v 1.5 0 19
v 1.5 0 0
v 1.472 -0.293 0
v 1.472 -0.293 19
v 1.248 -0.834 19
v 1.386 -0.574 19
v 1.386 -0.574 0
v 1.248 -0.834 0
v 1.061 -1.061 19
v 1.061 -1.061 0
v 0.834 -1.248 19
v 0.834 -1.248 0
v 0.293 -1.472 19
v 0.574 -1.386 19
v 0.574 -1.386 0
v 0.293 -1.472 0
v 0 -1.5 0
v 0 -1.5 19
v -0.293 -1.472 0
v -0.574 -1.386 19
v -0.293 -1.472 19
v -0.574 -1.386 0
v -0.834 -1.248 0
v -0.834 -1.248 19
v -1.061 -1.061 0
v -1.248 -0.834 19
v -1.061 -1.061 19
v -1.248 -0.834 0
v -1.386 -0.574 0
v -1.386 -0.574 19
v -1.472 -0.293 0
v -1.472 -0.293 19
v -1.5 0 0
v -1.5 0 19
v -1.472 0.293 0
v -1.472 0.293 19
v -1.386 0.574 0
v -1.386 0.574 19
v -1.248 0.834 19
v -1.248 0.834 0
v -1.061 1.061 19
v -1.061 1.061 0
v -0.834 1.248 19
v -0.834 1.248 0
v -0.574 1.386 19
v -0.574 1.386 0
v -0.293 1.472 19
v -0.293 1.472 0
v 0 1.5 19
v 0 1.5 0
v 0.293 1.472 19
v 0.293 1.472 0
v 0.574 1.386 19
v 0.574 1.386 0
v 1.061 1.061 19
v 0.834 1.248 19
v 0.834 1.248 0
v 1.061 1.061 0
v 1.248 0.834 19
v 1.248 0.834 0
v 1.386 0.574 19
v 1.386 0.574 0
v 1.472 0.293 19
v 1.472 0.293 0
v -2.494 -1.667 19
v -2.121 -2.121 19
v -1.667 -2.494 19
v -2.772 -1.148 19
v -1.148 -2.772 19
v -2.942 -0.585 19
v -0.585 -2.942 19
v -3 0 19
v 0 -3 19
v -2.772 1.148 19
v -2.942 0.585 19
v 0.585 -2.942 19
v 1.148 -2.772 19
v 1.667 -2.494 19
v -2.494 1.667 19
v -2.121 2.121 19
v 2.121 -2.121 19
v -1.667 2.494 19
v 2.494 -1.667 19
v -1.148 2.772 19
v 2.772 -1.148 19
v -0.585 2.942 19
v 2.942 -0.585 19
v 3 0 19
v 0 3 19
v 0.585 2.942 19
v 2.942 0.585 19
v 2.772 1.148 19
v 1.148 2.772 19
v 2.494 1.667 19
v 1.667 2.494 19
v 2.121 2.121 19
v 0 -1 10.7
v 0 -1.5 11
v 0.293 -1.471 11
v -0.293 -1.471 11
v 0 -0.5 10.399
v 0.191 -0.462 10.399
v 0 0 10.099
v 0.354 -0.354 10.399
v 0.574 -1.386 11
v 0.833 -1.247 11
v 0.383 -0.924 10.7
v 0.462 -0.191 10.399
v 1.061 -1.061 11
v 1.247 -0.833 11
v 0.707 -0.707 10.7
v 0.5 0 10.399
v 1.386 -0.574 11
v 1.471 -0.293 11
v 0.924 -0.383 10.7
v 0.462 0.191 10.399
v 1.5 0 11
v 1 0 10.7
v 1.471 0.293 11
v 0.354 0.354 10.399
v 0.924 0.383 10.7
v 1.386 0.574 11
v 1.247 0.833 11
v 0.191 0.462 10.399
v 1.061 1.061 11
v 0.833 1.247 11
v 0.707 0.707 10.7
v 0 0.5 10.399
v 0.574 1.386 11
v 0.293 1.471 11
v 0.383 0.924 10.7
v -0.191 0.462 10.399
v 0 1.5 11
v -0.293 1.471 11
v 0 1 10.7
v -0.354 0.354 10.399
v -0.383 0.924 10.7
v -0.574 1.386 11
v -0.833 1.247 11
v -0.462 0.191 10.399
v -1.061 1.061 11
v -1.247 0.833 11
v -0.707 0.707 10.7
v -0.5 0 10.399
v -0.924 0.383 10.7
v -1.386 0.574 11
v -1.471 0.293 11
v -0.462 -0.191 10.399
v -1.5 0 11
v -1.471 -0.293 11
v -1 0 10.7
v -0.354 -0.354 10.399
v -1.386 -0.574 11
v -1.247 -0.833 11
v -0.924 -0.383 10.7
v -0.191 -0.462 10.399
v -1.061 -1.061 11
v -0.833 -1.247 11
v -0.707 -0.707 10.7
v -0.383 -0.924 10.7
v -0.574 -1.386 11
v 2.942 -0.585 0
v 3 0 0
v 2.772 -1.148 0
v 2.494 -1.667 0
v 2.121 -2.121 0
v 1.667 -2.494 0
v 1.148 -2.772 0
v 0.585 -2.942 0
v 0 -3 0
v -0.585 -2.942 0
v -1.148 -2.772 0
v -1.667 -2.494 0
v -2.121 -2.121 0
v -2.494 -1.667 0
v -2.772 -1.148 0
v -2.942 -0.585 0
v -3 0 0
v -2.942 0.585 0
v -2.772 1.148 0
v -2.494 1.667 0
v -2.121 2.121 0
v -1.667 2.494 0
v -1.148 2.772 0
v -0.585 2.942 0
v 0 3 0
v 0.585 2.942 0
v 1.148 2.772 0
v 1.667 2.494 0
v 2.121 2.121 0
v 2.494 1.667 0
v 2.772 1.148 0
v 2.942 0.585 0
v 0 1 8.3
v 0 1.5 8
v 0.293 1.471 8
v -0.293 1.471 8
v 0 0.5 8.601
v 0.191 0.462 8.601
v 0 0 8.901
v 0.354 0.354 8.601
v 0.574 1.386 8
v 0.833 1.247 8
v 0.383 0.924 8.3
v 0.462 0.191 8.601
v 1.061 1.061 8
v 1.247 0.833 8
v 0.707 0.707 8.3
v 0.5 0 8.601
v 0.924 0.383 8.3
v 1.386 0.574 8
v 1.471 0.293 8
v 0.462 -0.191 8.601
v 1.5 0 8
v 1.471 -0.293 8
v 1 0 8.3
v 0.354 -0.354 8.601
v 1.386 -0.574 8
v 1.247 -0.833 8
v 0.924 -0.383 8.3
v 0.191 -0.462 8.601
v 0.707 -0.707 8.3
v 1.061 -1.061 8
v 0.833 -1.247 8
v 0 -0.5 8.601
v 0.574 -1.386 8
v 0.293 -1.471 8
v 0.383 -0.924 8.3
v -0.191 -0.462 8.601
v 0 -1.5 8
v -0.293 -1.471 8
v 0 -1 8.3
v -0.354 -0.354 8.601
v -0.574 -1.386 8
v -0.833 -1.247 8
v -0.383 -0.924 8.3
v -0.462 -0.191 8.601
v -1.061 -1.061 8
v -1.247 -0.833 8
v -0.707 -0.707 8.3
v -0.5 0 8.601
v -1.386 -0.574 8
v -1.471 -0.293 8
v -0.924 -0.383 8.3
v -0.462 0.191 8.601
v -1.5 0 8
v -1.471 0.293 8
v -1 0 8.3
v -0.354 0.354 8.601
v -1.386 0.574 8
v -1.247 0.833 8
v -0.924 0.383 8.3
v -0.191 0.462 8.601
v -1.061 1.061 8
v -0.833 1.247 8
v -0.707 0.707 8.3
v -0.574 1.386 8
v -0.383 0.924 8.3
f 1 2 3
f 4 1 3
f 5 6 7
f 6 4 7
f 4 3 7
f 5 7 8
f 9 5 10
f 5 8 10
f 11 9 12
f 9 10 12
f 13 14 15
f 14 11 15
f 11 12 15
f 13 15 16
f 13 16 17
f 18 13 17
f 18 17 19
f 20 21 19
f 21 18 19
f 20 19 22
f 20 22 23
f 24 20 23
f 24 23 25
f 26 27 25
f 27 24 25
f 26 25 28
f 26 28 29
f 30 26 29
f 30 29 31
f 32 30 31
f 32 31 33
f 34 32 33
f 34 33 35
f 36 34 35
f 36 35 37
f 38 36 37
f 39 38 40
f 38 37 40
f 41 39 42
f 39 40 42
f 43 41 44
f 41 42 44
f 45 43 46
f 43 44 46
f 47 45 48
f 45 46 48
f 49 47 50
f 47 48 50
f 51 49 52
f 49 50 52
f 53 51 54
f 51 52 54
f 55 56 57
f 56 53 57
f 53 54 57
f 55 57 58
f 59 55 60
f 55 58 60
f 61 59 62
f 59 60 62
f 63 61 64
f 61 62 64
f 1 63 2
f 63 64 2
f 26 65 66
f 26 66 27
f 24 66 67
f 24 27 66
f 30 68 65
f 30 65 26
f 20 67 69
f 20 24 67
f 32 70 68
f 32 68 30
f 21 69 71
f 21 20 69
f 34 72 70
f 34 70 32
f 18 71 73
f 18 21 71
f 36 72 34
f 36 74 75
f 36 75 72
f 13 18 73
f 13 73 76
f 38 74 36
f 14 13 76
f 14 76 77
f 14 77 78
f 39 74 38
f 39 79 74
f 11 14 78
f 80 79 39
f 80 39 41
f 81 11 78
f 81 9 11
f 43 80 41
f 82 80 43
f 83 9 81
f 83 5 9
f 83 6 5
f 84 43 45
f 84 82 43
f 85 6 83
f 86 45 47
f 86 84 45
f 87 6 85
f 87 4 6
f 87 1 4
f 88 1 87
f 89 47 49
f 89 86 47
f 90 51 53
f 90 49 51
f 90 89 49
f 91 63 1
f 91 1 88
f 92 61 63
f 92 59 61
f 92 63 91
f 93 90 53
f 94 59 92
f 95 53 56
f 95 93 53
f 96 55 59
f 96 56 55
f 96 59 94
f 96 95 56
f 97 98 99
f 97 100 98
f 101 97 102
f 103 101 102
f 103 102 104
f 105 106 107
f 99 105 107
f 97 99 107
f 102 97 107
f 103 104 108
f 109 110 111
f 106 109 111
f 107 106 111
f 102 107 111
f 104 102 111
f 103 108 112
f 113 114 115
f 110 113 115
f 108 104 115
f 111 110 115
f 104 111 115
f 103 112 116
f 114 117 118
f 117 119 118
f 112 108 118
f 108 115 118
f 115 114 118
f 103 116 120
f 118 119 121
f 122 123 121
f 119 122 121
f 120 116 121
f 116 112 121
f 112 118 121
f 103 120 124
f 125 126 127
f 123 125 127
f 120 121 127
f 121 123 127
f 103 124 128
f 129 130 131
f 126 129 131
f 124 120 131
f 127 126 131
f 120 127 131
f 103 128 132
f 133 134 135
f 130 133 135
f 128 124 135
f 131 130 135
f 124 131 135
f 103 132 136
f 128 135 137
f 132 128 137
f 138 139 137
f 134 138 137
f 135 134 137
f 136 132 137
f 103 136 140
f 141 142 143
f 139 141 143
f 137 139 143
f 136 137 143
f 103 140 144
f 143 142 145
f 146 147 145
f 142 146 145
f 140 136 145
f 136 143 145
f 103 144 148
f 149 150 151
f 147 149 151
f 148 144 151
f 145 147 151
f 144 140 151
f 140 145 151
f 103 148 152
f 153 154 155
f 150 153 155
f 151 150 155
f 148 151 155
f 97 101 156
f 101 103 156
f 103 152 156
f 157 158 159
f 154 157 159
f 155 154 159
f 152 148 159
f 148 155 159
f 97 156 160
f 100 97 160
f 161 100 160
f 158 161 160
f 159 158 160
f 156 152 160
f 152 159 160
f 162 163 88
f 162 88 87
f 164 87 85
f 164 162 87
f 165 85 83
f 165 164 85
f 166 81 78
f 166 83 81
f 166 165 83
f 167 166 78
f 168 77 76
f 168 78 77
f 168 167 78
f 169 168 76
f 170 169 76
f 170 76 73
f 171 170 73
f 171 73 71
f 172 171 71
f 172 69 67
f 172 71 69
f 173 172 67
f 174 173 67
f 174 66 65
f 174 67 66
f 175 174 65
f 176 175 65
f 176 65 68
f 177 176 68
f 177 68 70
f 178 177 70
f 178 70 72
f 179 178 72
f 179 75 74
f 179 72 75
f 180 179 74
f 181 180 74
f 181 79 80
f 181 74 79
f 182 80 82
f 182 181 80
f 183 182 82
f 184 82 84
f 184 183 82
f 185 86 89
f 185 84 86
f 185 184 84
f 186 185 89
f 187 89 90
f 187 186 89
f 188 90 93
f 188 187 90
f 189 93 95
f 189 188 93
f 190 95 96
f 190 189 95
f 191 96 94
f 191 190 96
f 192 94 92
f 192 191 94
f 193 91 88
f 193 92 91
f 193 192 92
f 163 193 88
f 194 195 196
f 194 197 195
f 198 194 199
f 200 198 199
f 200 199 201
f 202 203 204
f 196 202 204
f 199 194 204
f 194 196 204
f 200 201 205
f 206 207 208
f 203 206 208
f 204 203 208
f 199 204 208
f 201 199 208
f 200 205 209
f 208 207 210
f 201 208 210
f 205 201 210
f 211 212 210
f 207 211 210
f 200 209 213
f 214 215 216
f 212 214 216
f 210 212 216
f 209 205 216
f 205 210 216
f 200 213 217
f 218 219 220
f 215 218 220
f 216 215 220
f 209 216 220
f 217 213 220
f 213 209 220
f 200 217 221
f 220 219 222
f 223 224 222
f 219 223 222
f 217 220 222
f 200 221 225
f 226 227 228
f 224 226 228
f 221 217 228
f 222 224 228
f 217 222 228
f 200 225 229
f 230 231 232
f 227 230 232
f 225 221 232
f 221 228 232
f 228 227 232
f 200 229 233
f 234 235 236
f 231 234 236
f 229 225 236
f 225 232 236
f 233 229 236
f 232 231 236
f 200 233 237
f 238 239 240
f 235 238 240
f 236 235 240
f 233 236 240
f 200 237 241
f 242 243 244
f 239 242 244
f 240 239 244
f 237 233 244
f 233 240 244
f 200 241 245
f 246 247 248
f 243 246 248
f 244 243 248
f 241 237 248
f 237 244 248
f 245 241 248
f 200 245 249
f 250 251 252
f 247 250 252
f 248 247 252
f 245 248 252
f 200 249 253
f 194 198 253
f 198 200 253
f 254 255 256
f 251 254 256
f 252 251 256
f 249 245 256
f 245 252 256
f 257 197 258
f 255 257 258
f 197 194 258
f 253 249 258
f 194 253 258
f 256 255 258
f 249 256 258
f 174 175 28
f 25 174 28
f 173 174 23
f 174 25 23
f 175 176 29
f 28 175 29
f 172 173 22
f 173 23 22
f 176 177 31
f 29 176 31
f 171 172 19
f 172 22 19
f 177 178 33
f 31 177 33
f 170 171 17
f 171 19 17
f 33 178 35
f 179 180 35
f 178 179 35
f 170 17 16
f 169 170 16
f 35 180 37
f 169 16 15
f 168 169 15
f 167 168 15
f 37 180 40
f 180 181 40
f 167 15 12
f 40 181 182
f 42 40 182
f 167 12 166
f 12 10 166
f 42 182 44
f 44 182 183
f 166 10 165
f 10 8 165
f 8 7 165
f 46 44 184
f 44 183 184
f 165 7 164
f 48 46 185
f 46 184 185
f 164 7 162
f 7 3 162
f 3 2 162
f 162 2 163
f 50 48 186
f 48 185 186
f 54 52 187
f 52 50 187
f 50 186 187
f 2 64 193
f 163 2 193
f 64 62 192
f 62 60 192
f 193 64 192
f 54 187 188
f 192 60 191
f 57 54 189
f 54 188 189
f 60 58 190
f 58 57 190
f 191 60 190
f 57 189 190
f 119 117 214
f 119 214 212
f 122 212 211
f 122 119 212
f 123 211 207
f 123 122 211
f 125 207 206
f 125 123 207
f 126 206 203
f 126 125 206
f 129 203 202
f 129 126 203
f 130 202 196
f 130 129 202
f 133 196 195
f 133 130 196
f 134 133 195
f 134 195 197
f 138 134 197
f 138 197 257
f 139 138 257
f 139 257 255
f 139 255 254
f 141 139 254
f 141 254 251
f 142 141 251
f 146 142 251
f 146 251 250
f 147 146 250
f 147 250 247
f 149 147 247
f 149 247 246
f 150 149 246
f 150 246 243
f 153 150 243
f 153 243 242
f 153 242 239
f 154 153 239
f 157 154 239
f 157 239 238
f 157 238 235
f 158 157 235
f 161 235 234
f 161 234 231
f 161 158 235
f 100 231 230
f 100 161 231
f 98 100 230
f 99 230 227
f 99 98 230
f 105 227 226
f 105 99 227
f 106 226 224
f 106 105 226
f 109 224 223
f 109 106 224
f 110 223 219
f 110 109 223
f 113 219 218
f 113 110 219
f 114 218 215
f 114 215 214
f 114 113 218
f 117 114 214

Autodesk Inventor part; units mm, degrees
ref_plane "YZ Plane" through (0, 0, 0) normal (1, 0, 0) x (0, 1, 0)
ref_plane "XZ Plane" through (0, 0, 0) normal (0, 1, 0) x (-1, 0, 0)
ref_plane "XY Plane" through (0, 0, 0) normal (0, 0, 1) x (1, 0, 0)
sketch "スケッチ1" plane through (0, 0, 0) normal (0, 0, 1) x (1, 0, 0)
  circle A0 centre (0, 0) radius 3
  circle A1 centre (0, 0) radius 1.5005
  dimension "d0" = 6
  dimension "d1" = 3.001
extrude "押し出し1" add sketch "スケッチ1" along normal blind 19
sketch "スケッチ2" plane through (0, 0, 19) normal (0, 0, 1) x (1, 0, 0)
  circle A0 centre (0, 0) radius 1.5
  dimension "d4" = 3
extrude "押し出し2" add sketch "スケッチ2" against normal blind 19
hole "穴1" at (0, 0, 19) direction (0, 0, -1) diameter 3 depth 8 tip angle 118
hole "穴2" at (0, 0, 0) direction (0, 0, 1) diameter 3 depth 8 tip angle 118
properties part number "スペーサーm3-19　簡易筒型" material "アルミニウム 2014-T4"
